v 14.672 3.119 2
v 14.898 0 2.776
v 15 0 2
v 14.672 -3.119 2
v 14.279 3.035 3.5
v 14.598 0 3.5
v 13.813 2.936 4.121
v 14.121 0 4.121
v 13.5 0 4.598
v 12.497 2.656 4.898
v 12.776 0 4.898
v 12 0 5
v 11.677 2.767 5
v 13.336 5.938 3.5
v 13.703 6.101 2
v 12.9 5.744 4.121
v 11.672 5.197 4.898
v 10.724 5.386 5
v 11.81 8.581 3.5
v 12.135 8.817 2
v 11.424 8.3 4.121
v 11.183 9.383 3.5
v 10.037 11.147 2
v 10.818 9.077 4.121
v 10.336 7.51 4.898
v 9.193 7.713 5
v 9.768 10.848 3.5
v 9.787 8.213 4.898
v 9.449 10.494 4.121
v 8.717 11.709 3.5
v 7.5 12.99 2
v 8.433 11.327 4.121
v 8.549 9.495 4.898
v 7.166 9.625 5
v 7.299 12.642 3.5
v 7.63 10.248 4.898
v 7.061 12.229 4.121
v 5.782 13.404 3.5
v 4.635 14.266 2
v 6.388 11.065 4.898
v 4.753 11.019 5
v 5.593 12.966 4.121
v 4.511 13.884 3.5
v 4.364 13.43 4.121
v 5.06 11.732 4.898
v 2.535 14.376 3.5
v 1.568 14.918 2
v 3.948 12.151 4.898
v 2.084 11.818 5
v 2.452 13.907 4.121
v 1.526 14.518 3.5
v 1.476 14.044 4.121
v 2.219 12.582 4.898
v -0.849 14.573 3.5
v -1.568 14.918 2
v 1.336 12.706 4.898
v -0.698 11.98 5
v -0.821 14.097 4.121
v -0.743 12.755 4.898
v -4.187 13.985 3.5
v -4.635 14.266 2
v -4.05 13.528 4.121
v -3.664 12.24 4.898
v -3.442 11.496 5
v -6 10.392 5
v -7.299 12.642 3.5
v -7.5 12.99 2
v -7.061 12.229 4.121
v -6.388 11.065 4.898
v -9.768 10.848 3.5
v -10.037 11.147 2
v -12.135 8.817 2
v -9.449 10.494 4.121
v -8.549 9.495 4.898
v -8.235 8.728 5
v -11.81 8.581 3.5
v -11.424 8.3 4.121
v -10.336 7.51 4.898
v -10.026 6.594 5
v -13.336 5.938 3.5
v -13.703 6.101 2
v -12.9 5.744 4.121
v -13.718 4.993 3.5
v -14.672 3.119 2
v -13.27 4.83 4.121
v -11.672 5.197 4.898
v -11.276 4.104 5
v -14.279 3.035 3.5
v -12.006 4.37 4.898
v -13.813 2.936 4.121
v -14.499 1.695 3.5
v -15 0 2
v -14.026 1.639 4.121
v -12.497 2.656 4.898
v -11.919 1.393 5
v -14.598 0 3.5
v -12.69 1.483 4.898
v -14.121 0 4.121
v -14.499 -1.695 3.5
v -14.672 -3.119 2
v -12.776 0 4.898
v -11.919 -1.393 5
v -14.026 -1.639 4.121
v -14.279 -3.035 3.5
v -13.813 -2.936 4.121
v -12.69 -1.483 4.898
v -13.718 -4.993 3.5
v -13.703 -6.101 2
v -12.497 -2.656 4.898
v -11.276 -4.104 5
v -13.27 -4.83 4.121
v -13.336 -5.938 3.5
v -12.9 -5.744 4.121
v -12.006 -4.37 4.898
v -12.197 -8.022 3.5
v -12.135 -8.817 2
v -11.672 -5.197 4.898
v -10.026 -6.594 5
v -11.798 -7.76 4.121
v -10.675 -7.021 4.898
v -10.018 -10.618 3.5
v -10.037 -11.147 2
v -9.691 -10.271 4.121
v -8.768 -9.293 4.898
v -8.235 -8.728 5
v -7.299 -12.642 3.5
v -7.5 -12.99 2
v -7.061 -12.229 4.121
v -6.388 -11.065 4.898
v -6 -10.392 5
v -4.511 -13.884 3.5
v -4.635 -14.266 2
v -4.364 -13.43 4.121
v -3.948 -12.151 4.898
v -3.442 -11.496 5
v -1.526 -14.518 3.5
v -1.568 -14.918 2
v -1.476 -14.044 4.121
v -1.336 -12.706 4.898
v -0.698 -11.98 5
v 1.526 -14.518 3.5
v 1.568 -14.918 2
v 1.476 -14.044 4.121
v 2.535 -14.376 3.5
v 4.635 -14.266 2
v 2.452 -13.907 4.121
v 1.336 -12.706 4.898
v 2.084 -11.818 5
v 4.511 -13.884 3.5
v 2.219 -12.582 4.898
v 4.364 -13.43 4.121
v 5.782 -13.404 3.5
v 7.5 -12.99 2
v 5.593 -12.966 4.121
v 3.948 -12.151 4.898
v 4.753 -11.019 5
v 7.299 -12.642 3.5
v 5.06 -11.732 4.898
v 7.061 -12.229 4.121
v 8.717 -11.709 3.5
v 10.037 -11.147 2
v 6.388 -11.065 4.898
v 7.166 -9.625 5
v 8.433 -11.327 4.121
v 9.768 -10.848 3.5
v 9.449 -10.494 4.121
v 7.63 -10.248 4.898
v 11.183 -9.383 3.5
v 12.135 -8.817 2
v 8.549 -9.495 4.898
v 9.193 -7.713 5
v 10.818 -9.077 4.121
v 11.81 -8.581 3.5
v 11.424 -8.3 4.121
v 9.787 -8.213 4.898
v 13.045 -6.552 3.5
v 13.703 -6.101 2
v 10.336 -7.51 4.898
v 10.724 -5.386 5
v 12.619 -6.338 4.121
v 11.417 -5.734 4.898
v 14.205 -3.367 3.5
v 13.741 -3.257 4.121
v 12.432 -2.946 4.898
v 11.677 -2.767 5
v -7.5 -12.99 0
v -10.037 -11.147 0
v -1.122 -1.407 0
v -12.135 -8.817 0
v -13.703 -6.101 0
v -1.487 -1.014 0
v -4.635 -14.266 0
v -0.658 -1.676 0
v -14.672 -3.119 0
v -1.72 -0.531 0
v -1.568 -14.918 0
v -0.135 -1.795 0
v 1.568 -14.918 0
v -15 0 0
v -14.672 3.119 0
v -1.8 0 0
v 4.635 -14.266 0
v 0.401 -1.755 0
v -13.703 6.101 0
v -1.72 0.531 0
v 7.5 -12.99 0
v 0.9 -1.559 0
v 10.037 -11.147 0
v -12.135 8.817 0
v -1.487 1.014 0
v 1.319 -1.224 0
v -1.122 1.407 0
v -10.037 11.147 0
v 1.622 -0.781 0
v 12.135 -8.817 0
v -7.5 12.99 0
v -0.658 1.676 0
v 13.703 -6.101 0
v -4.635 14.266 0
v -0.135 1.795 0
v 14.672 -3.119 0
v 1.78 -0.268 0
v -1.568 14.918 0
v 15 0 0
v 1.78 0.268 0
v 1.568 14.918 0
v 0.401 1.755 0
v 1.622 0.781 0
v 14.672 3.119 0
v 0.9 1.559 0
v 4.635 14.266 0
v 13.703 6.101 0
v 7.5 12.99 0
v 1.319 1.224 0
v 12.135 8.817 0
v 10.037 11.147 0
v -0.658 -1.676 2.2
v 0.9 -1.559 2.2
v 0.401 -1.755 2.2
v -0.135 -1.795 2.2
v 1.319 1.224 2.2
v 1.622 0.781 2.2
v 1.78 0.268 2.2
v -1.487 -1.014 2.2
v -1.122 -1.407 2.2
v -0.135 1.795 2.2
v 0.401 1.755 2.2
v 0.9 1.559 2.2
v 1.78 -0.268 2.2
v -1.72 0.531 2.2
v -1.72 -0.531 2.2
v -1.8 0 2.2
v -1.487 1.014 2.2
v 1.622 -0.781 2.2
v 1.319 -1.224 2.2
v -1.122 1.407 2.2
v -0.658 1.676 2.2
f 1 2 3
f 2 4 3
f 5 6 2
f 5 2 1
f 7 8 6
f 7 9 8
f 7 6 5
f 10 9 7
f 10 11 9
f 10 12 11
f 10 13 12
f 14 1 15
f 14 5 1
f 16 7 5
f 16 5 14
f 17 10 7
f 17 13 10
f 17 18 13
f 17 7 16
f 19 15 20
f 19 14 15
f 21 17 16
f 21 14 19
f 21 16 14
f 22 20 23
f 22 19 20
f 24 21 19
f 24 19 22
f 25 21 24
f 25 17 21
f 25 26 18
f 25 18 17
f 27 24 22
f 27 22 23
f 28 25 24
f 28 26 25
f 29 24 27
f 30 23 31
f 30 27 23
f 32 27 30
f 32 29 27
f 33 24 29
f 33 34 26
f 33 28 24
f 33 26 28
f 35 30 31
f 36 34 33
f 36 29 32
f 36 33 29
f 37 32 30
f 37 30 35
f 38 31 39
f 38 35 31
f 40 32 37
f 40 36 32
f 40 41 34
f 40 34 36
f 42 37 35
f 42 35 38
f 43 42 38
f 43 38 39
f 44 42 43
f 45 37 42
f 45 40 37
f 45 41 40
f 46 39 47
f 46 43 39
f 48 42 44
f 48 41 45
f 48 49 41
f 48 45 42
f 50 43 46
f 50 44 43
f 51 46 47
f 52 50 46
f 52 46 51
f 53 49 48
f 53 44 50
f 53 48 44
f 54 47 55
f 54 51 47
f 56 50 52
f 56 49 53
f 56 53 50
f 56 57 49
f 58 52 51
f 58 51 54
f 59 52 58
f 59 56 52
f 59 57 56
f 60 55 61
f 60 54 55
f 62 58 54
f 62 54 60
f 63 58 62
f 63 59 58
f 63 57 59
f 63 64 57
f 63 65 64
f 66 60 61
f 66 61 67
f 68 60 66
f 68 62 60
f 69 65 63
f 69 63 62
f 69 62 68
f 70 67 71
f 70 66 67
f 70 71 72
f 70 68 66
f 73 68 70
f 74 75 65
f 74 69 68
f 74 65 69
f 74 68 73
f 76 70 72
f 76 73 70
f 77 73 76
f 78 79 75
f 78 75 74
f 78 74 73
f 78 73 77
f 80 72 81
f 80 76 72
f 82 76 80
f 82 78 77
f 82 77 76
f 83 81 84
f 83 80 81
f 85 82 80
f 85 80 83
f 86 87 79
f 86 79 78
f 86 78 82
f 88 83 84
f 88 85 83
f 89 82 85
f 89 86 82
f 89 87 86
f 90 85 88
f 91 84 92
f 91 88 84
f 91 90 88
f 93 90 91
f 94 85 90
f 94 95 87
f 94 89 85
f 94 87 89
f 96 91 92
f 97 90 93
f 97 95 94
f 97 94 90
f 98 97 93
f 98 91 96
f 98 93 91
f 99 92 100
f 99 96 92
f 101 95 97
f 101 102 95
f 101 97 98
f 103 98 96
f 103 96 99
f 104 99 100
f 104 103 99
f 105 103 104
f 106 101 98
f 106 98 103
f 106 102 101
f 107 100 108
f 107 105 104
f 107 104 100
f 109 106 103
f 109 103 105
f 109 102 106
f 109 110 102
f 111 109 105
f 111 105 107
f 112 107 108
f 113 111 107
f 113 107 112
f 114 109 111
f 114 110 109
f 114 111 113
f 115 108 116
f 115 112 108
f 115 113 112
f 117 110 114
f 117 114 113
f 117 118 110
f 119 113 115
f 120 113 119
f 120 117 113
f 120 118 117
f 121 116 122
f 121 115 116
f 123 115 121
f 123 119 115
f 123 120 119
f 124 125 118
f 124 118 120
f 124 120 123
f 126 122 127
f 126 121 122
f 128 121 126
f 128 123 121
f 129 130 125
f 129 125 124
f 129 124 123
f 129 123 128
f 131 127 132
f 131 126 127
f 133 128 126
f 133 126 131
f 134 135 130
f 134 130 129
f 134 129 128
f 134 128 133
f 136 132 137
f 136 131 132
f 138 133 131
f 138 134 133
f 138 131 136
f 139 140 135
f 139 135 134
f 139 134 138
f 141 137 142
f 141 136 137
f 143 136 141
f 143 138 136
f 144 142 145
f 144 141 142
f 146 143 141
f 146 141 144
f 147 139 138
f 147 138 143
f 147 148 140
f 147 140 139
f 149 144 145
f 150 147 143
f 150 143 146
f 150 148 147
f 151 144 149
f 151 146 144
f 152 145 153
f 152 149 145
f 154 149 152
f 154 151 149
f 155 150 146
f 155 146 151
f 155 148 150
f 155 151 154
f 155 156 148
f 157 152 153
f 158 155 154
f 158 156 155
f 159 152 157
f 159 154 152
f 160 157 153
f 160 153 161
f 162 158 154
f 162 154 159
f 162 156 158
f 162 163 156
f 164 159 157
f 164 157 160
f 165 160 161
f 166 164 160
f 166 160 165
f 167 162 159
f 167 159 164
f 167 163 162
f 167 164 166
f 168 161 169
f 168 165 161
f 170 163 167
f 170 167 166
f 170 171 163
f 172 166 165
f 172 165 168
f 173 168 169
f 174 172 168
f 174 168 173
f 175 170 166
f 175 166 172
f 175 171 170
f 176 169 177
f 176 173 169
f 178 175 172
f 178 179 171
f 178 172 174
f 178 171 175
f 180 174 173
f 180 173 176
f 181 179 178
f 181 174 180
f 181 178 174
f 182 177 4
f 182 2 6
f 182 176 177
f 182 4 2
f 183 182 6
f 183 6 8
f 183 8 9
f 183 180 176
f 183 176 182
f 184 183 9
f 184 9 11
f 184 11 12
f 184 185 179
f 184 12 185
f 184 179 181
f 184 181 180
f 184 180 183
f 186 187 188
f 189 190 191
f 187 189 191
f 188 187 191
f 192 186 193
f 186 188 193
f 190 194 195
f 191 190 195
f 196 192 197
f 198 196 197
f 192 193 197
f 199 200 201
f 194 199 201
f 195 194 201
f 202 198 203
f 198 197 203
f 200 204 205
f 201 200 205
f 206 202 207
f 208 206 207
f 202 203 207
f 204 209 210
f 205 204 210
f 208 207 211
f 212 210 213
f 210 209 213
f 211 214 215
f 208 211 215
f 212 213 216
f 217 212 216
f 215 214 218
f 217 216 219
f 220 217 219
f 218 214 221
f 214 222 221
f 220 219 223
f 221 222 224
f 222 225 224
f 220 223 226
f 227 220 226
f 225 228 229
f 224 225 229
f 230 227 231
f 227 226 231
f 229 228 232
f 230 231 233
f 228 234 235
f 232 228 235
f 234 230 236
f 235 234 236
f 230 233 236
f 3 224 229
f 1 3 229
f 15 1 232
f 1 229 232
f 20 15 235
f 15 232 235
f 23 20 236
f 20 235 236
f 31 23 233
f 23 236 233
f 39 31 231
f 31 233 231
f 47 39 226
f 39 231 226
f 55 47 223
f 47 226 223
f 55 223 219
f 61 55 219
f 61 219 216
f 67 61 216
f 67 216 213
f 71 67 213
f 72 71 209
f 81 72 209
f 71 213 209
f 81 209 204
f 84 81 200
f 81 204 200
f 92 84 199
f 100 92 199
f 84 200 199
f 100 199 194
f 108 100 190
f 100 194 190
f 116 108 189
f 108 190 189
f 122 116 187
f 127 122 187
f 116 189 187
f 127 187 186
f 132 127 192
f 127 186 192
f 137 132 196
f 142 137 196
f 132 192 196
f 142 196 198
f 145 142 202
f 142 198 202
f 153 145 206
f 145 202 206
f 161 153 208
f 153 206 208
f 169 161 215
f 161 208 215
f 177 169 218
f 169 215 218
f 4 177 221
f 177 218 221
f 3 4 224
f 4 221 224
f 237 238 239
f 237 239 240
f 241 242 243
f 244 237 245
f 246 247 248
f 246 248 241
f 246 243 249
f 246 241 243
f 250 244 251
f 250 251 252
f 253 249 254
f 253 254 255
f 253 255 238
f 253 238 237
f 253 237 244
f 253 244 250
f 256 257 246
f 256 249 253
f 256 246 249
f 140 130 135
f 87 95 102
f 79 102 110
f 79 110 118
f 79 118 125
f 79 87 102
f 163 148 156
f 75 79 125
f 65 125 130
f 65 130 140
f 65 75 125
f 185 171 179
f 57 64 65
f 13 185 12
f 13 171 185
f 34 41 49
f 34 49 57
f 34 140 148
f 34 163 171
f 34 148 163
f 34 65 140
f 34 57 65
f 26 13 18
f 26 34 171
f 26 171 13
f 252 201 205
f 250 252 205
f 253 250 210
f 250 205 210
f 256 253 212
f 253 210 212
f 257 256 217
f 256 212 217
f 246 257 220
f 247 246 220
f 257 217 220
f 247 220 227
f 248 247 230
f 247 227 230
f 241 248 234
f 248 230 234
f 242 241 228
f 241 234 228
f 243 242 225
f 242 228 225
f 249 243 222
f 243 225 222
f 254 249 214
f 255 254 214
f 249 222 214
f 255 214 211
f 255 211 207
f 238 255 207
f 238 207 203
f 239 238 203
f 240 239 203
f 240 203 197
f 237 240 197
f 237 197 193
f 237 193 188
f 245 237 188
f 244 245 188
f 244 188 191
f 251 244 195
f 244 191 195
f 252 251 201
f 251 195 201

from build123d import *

# Parameters (mm, degrees)
SKETCH1_R           = 15
BOSS_EXTRUDE1_DEPTH = 5
FILLET1_R           = 3
SKETCH2_R           = 1.8
CUT_EXTRUDE1_DEPTH  = 2.2


with BuildPart() as part:
    # Sketch1 → Boss-Extrude1 (new body)
    with BuildSketch(Plane.XY):
        Circle(SKETCH1_R)
    extrude(amount=BOSS_EXTRUDE1_DEPTH)

    # Fillet1
    fillet1_edges = [part.edges().sort_by_distance(p)[0] for p in [
        (-15, 0, 5),
    ]]
    fillet(fillet1_edges, radius=FILLET1_R)

    # Sketch2 → Cut-Extrude1 (cut)
    with BuildSketch(Plane(origin=(0, 0, 0), x_dir=(-1, 0, 0), z_dir=(0, 0, -1))):
        Circle(SKETCH2_R)
    extrude(amount=-CUT_EXTRUDE1_DEPTH, mode=Mode.SUBTRACT)


solid = part.part
